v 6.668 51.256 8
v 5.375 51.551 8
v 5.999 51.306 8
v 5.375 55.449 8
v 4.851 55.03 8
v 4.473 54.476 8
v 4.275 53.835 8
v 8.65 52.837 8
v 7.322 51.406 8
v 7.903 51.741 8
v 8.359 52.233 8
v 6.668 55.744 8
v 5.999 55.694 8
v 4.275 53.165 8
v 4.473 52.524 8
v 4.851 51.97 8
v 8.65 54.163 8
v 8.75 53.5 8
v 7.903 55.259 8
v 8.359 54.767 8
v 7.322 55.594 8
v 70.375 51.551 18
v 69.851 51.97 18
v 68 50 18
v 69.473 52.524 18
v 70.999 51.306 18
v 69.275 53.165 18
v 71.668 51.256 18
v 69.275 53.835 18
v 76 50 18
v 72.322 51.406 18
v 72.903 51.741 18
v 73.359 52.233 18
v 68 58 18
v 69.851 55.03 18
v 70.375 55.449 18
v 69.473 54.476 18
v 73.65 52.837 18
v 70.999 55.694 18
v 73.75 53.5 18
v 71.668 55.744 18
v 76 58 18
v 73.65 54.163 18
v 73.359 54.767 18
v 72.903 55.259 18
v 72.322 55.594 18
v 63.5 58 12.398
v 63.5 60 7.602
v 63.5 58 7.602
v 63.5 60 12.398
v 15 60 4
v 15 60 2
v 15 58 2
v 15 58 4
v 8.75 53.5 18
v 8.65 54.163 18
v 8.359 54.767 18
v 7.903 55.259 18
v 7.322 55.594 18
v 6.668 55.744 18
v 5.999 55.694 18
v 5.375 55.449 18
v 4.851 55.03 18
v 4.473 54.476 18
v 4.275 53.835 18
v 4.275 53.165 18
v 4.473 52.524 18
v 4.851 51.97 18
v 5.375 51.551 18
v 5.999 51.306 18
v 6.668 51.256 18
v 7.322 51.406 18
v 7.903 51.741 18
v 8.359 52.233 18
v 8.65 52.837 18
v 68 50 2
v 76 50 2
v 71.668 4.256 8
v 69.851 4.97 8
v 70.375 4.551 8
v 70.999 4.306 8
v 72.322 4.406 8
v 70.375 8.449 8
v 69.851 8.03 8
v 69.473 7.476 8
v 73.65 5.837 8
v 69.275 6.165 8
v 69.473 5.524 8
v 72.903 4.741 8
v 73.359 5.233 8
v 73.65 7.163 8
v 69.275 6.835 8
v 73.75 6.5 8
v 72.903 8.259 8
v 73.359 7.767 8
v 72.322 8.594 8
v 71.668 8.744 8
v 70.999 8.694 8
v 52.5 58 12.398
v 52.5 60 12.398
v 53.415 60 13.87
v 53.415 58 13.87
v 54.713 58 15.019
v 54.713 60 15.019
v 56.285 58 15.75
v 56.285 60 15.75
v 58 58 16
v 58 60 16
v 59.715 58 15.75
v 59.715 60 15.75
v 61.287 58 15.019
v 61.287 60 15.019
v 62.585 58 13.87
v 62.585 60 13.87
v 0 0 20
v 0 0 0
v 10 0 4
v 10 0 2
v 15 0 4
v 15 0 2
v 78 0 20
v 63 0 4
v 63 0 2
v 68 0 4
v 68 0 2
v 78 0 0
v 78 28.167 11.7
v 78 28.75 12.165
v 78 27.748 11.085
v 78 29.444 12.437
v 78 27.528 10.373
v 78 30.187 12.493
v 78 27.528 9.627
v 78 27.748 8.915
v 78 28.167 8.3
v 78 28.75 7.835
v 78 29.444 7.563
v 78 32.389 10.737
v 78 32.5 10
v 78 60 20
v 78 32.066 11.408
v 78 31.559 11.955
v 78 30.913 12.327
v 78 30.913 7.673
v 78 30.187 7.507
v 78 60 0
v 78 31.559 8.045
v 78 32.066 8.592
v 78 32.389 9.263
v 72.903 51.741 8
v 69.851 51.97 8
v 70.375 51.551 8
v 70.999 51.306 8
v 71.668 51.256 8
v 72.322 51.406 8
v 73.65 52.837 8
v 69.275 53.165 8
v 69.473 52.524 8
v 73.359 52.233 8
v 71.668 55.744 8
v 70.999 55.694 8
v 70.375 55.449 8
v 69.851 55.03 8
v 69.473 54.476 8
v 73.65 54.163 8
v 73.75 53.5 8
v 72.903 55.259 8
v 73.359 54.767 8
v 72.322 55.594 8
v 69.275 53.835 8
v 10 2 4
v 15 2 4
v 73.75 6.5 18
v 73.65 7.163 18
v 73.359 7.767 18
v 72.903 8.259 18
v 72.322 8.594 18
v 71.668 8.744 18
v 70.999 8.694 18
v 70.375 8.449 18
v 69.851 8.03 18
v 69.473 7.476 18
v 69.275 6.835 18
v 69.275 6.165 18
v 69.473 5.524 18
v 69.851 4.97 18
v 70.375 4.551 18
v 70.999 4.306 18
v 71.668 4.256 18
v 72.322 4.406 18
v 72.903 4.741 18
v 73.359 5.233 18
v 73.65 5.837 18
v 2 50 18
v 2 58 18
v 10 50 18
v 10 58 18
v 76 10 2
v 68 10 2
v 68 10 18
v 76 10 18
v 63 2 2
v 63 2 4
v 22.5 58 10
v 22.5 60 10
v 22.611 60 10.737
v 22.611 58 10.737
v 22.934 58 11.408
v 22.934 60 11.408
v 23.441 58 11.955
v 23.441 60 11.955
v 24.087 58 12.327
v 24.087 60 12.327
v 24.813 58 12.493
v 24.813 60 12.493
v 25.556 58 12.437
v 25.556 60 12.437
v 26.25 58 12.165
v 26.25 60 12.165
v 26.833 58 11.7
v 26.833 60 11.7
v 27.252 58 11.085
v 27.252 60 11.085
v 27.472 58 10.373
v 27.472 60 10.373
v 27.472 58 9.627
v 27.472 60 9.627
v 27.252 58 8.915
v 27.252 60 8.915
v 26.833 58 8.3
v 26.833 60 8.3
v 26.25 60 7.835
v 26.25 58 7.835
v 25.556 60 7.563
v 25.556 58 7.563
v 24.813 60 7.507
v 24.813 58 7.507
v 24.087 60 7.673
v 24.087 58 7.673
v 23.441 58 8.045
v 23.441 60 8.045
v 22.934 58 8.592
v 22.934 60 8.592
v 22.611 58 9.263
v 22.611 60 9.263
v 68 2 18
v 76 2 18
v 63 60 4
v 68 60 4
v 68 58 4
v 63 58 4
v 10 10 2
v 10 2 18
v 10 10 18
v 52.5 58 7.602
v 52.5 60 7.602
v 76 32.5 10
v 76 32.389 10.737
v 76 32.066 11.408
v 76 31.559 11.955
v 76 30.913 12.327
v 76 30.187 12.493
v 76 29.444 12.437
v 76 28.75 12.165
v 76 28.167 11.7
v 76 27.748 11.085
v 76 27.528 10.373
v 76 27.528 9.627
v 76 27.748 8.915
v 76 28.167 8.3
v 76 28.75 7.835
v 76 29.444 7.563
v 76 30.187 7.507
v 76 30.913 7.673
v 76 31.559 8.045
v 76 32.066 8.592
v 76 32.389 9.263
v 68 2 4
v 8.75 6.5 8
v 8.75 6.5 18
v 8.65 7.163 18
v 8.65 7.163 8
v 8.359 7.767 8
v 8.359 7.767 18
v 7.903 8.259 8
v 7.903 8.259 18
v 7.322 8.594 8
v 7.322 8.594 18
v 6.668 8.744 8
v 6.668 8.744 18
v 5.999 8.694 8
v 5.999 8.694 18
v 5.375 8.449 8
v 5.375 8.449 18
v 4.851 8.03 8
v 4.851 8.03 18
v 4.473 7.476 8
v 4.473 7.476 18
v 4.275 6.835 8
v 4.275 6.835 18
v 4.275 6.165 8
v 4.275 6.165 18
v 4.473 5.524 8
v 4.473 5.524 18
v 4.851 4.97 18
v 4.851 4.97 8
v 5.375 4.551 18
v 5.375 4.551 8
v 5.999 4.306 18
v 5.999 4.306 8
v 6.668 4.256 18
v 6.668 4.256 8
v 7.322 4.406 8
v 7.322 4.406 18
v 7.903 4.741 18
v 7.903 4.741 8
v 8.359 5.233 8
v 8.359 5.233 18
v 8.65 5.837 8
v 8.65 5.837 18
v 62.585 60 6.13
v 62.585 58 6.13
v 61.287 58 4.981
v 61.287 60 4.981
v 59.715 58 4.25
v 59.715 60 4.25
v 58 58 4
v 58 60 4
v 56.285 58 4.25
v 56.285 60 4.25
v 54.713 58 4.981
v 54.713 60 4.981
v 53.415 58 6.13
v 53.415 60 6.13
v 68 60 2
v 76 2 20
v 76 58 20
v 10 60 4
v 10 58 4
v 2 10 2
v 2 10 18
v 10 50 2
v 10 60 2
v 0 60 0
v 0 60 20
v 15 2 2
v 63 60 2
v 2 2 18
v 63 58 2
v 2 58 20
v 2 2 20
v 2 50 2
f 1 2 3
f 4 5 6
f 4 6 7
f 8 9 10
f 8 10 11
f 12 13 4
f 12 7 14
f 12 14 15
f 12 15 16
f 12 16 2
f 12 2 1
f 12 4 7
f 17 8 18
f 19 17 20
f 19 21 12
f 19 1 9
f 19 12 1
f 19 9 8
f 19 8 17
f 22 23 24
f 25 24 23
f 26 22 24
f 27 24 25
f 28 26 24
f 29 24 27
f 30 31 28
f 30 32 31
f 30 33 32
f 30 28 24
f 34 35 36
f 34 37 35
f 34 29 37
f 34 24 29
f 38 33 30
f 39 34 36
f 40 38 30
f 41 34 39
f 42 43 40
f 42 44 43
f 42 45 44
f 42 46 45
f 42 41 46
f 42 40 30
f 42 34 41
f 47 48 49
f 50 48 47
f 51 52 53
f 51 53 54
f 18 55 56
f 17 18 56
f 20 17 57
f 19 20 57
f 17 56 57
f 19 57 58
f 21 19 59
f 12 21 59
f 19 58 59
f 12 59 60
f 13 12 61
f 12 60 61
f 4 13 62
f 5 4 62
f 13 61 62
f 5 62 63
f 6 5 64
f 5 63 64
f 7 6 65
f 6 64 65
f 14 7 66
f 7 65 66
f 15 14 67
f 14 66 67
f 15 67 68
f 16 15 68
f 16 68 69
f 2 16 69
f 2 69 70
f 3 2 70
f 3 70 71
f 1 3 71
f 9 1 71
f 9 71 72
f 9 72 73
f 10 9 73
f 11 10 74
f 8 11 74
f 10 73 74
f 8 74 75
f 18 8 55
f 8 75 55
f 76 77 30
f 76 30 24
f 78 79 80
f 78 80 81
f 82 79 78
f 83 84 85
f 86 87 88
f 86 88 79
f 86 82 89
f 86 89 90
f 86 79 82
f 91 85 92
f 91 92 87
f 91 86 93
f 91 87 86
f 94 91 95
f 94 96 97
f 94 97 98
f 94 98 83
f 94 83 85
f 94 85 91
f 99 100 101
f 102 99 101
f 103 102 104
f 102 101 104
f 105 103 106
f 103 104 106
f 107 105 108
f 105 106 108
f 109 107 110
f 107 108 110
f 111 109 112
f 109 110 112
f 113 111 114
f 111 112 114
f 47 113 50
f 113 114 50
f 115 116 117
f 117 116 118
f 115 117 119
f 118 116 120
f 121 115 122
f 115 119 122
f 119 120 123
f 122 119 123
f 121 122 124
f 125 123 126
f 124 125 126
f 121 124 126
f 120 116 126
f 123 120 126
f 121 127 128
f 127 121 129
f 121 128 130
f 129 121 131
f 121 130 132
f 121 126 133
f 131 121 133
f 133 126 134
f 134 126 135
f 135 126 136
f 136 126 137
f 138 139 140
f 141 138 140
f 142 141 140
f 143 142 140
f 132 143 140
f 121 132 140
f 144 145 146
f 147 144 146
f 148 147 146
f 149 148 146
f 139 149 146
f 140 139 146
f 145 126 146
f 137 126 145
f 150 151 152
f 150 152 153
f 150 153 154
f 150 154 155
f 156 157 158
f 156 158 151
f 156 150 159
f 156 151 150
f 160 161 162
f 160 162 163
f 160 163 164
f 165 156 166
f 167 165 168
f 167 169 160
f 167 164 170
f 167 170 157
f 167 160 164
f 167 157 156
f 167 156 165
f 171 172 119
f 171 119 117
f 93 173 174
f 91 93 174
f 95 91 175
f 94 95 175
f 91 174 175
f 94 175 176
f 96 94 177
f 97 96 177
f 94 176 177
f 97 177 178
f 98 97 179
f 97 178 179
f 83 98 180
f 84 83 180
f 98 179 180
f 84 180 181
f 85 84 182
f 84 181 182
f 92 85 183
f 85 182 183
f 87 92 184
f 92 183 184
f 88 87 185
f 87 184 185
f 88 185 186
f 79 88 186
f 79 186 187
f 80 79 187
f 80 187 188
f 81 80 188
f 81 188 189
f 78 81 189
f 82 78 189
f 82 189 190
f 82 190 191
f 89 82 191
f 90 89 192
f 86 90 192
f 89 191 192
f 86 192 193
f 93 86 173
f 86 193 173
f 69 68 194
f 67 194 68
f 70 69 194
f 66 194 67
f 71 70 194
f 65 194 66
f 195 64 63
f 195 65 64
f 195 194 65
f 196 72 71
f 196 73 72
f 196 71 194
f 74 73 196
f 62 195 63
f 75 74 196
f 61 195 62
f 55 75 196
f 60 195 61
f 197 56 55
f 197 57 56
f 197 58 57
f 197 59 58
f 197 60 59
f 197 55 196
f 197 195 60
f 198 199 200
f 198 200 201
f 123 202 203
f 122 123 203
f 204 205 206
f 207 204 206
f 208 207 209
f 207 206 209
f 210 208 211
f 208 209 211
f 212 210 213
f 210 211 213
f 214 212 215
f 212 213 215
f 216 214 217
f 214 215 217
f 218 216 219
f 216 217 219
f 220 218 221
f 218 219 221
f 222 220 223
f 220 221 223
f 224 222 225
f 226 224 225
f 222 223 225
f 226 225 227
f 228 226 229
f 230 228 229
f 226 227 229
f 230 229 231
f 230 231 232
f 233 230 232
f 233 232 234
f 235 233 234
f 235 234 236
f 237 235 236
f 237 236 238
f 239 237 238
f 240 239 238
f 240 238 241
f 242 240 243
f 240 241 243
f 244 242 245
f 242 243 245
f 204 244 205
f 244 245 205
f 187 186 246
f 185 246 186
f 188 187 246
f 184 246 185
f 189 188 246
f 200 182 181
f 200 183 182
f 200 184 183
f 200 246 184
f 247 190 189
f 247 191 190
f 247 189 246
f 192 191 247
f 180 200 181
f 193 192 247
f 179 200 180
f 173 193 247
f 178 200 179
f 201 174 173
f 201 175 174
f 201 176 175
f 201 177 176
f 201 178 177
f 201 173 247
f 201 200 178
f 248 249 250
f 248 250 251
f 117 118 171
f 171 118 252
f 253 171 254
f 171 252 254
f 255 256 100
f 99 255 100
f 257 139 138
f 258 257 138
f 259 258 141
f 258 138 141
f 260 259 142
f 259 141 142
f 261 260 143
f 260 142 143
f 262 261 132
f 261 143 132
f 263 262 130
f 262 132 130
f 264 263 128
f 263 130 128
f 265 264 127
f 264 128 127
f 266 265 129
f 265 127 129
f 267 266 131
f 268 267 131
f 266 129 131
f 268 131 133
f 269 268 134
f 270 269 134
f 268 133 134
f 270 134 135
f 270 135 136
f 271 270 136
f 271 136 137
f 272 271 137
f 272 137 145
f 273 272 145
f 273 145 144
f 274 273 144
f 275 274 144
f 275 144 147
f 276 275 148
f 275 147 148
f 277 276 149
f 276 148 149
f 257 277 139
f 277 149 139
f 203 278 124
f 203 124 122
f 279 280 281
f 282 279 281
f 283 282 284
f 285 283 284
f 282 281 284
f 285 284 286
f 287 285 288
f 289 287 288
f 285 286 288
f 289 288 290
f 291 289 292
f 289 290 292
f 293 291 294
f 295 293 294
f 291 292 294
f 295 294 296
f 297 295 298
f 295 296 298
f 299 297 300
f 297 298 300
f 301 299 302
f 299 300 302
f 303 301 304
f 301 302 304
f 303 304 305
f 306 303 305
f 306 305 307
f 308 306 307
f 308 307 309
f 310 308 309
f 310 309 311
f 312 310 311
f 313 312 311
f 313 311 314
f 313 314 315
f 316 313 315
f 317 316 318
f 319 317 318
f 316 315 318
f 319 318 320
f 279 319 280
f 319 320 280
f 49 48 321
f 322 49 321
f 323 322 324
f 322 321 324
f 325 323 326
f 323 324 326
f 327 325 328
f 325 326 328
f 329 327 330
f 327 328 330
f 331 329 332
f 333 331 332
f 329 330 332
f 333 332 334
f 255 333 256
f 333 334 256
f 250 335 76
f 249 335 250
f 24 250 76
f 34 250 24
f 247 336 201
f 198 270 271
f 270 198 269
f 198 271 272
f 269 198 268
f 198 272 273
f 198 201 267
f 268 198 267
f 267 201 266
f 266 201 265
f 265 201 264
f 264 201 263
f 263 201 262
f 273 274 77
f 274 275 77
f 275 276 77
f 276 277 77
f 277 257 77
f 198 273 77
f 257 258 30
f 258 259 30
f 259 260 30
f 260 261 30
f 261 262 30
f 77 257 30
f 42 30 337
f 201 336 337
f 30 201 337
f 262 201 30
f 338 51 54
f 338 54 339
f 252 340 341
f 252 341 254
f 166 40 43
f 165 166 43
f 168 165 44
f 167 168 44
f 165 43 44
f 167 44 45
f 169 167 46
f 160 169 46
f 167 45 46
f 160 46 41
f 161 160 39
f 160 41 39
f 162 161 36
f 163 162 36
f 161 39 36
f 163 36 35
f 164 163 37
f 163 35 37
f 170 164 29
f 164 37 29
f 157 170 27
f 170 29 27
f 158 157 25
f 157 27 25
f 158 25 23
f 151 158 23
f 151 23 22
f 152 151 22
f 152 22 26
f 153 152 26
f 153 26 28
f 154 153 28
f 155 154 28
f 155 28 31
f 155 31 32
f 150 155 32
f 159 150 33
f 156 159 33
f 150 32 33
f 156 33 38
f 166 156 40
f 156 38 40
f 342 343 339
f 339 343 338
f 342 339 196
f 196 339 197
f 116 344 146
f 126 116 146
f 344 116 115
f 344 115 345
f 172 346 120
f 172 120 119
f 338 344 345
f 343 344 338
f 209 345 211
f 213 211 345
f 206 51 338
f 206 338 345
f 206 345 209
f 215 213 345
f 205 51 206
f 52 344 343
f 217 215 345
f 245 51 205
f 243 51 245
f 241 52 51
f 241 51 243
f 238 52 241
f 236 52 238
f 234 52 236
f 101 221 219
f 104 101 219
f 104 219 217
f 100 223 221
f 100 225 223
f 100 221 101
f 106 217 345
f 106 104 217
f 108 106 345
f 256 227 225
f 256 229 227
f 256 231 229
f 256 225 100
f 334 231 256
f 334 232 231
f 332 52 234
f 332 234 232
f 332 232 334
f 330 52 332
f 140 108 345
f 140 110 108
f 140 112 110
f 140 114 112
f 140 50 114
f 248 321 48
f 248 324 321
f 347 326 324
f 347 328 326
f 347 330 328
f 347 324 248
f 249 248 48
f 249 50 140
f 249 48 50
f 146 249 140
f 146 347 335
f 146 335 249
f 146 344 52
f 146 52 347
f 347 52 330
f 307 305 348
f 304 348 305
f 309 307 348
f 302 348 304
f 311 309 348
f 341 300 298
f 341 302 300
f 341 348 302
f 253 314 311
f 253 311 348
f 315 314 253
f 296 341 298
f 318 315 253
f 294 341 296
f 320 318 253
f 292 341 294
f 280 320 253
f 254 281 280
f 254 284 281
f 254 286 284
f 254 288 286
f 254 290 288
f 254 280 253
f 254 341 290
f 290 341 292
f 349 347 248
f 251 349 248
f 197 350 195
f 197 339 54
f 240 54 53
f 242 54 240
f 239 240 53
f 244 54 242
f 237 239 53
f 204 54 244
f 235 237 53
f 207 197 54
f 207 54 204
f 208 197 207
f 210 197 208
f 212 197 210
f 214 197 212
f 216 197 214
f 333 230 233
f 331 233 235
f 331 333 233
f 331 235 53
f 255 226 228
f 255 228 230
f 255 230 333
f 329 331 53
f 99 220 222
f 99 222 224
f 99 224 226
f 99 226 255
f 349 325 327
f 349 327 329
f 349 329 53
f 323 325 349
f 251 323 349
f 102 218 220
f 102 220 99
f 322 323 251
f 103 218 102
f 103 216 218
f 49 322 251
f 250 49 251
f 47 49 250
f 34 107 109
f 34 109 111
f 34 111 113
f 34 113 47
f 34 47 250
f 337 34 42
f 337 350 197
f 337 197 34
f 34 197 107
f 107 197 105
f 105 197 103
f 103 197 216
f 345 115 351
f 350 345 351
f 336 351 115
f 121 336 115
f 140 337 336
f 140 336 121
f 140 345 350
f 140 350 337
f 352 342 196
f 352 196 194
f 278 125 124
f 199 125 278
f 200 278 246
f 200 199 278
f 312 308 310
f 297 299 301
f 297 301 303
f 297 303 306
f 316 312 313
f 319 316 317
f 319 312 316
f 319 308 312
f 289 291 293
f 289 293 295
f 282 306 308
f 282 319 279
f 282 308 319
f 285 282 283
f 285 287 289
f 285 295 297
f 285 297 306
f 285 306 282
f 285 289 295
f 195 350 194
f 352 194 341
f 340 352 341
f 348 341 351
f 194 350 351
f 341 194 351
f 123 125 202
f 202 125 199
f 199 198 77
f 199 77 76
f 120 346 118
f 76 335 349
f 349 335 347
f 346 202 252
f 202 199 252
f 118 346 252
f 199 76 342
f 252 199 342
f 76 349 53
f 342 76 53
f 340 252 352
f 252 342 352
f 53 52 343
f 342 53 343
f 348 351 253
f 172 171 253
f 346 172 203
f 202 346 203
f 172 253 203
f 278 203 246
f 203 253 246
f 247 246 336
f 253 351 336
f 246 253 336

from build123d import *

# Parameters (mm, degrees)
SKETCH_W        = 78
SKETCH_H        = 60
PAD_DEPTH       = 20
POCKET_DEPTH    = 18
SKETCH002_W     = 74
SKETCH002_H     = 56
POCKET001_DEPTH = 2
SKETCH003_R     = 2.25
POCKET002_DEPTH = 10
SKETCH004_R     = 2.5
POCKET003_DEPTH = 2
SKETCH005_R     = 2.5
POCKET004_DEPTH = 2
SKETCH006_W     = 5
SKETCH006_H     = 2
POCKET005_DEPTH = 60.001


with BuildPart() as part:
    # Sketch → Pad (new body)
    with BuildSketch(Plane.XY):
        with Locations((39, 30)):
            Rectangle(SKETCH_W, SKETCH_H)
    extrude(amount=PAD_DEPTH)

    # Sketch001 (on Face6 of Pad) → Pocket (cut)
    with BuildSketch(Plane.XY.offset(20)):
        Polygon((2, 50), (2, 10), (10, 10), (10, 2), (68, 2), (68, 10), (76, 10), (76, 50), (68, 50), (68, 58), (10, 58), (10, 50), align=None)
    extrude(amount=-POCKET_DEPTH, mode=Mode.SUBTRACT)

    # Sketch002 (on Face5 of Pocket) → Pocket001 (cut)
    with BuildSketch(Plane.XY.offset(20)):
        with Locations((39, 30)):
            Rectangle(SKETCH002_W, SKETCH002_H)
    extrude(amount=-POCKET001_DEPTH, mode=Mode.SUBTRACT)

    # Sketch003 (on Face26 of Pocket001) → Pocket002 (cut)
    with BuildSketch(Plane.XY.offset(18)):
        with Locations((6.5, 53.5)):
            Circle(SKETCH003_R)
        with Locations((71.5, 53.5)):
            Circle(SKETCH003_R)
        with Locations((6.5, 6.5)):
            Circle(SKETCH003_R)
        with Locations((71.5, 6.5)):
            Circle(SKETCH003_R)
    extrude(amount=-POCKET002_DEPTH, mode=Mode.SUBTRACT)

    # Sketch004 (on Face3 of Pocket002) → Pocket003 (cut)
    with BuildSketch(Plane.YZ.offset(78)):
        with Locations((30, 10)):
            Circle(SKETCH004_R)
    extrude(amount=-POCKET003_DEPTH, mode=Mode.SUBTRACT)

    # Sketch005 (on Face6 of Pocket003) → Pocket004 (cut)
    with BuildSketch(Plane(origin=(0, 60, 0), x_dir=(-1, 0, 0), z_dir=(0, 1, 0))):
        with Locations((-25, 10)):
            Circle(SKETCH005_R)
        with BuildLine():
            Line((-63.5, 7.602084), (-63.5, 12.397916))
            ThreePointArc((-52.5, 12.397916), (-58, 16), (-63.5, 12.397916))
            Line((-52.5, 7.602084), (-52.5, 12.397916))
            ThreePointArc((-63.5, 7.602084), (-58, 4), (-52.5, 7.602084))
        make_face()
    extrude(amount=-POCKET004_DEPTH, mode=Mode.SUBTRACT)

    # Sketch006 (on Face6 of Pocket004) → Pocket005 (cut, through all)
    with BuildSketch(Plane(origin=(0, 60, 0), x_dir=(-1, 0, 0), z_dir=(0, 1, 0))):
        with Locations((-65.5, 3)):
            Rectangle(SKETCH006_W, SKETCH006_H)
        with Locations((-12.5, 3)):
            Rectangle(SKETCH006_W, SKETCH006_H)
    extrude(amount=-POCKET005_DEPTH, mode=Mode.SUBTRACT)


solid = part.part
